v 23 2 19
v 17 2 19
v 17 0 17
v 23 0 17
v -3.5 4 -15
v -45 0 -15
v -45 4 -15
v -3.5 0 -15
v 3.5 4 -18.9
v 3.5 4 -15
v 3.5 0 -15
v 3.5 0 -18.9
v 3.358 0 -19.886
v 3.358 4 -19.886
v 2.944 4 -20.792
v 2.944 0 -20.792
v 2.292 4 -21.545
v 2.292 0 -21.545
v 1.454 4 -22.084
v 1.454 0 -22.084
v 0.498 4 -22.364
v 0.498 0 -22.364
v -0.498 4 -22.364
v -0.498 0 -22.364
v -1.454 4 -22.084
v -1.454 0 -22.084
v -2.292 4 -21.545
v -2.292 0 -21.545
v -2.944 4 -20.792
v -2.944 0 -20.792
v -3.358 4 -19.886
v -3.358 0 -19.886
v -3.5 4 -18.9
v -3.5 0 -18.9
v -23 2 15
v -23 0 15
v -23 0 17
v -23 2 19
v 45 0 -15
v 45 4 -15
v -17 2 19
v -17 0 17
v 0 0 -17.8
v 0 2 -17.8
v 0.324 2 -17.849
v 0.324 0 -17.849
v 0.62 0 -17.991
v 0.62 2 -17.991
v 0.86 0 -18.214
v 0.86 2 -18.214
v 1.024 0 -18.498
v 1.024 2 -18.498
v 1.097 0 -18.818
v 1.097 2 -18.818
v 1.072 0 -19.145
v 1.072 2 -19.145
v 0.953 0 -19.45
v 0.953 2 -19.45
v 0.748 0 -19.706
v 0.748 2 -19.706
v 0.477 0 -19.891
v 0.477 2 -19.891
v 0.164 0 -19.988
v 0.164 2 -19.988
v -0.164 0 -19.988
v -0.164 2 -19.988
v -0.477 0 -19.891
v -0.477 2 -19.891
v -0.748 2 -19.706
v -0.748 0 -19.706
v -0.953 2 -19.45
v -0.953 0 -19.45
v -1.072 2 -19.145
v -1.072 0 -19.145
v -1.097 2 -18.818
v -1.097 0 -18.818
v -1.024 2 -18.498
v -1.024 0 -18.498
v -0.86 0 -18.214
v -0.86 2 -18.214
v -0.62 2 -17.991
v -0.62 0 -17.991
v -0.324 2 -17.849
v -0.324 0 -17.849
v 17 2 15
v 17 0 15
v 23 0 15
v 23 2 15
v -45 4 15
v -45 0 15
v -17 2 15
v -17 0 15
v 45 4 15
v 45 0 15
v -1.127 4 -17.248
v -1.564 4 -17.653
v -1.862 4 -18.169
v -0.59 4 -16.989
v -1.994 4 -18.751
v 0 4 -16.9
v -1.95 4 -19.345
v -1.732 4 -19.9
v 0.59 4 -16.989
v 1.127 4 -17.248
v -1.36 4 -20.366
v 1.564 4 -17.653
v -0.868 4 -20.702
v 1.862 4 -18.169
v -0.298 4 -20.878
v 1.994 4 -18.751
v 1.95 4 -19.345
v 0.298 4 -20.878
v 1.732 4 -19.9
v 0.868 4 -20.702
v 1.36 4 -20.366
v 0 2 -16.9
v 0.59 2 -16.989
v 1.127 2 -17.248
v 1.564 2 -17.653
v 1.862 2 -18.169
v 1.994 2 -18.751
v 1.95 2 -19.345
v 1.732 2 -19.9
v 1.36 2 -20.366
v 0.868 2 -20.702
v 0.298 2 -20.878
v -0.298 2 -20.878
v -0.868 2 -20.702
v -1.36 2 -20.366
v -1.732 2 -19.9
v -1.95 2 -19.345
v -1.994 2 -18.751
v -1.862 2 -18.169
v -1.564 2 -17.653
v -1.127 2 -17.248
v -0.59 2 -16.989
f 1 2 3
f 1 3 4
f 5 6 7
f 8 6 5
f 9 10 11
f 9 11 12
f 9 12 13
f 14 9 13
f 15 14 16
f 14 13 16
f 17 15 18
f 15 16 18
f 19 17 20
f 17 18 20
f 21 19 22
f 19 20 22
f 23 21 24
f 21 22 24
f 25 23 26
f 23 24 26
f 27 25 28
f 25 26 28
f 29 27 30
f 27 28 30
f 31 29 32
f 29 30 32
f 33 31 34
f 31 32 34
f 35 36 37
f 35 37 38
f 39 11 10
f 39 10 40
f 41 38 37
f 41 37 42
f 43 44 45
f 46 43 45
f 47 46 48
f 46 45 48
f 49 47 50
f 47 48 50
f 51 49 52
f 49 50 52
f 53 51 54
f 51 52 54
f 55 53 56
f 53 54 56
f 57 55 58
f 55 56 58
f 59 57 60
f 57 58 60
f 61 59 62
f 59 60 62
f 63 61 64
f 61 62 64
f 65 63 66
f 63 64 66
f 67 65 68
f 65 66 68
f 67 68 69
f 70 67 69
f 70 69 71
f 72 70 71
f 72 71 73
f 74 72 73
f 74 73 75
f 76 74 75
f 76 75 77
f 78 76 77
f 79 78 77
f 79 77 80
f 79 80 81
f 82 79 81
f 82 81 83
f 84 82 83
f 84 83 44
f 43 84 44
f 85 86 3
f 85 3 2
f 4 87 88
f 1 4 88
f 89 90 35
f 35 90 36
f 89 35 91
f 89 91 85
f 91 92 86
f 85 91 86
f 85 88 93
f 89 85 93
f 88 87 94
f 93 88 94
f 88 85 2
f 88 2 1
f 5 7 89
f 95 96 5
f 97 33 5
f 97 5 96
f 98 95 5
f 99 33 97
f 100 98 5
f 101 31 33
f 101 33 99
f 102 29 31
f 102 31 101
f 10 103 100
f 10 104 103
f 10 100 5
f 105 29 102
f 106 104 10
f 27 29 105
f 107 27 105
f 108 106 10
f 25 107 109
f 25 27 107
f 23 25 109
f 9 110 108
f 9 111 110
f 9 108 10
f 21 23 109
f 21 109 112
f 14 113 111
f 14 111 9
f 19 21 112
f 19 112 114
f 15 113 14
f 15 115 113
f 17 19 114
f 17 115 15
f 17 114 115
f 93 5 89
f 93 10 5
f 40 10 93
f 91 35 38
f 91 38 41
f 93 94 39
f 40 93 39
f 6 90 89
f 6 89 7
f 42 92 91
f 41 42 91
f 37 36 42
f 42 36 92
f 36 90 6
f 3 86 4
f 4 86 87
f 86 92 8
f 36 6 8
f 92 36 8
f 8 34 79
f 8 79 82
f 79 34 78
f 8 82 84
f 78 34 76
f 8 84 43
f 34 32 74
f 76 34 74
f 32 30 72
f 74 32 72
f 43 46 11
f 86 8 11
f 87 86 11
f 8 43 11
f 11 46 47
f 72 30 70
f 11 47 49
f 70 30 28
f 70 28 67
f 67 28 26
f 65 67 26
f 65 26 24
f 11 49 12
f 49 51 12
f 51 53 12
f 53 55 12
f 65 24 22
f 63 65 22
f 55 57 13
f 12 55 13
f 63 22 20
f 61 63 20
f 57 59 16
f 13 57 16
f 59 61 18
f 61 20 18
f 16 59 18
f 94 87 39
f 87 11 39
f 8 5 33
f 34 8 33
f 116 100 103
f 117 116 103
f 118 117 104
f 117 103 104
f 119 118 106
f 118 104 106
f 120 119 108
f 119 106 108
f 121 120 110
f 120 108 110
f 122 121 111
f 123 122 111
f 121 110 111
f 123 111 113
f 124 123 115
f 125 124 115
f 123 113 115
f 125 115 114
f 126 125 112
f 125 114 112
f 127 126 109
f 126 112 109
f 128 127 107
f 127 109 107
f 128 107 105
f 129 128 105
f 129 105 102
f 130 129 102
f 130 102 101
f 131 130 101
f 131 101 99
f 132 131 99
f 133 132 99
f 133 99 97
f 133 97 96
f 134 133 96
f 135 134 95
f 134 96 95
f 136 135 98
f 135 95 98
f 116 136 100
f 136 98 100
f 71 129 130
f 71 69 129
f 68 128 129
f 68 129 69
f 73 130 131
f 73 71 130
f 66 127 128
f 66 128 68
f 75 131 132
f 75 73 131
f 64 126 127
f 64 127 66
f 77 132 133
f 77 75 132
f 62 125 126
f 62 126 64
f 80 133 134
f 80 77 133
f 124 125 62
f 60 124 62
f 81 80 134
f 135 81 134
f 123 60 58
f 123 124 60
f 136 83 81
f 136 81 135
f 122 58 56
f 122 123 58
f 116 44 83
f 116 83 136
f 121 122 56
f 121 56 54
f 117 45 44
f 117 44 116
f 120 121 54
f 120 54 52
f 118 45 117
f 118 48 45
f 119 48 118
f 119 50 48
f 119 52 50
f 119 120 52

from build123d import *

# Parameters (mm, degrees)
SKETCH1_R           = 3.5
SKETCH1_W           = 90
SKETCH1_H           = 30
SKETCH1_W_2         = 7
SKETCH1_H_2         = 3.9
BOSS_EXTRUDE1_DEPTH = 4
SKETCH4_W           = 6
SKETCH4_H           = 2
BOSS_EXTRUDE2_DEPTH = 4
CHAMFER1_SIZE       = 2
CUT_EXTRUDE1_REACH  = 52.426
SKETCH5_R           = 1.1
SKETCH6_R           = 2
CUT_EXTRUDE2_DEPTH  = 2


with BuildPart() as part:
    # Sketch1 → Boss-Extrude1 (new body)
    with BuildSketch(Plane(origin=(0, 0, 0), x_dir=(1, 0, 0), z_dir=(0, 1, 0))):
        with Locations((0, 18.9)):
            Circle(SKETCH1_R)
        Rectangle(SKETCH1_W, SKETCH1_H)
        with Locations((0, 16.95)):
            Rectangle(SKETCH1_W_2, SKETCH1_H_2)
    extrude(amount=BOSS_EXTRUDE1_DEPTH)

    # Sketch4 → Boss-Extrude2 (add)
    with BuildSketch(Plane.XY.offset(15)):
        with Locations((-20, 1)):
            Rectangle(SKETCH4_W, SKETCH4_H)
        with Locations((20, 1)):
            Rectangle(SKETCH4_W, SKETCH4_H)
    extrude(amount=BOSS_EXTRUDE2_DEPTH)

    # Chamfer1
    chamfer1_edges = [part.edges().sort_by_distance(p)[0] for p in [
        (20, 0, 19),
        (-20, 0, 19),
    ]]
    chamfer(chamfer1_edges, length=CHAMFER1_SIZE - 0.0001)  # a hair under: the kernel refuses the full size

    # Sketch5 → Cut-Extrude1 (cut, up to next)
    with BuildSketch(Plane(origin=(0, 4, 0), x_dir=(1, 0, 0), z_dir=(0, 1, 0)), mode=Mode.PRIVATE) as cut_extrude1_sk1:
        with Locations(Location((0, 18.9, 0), (0, 0, 270))):
            Circle(SKETCH5_R)
    cut_extrude1_tool1 = extrude(cut_extrude1_sk1.sketch, amount=-CUT_EXTRUDE1_REACH, mode=Mode.PRIVATE) & part.part
    add(cut_extrude1_tool1.solids().sort_by_distance((0, 4, -18.9))[0], mode=Mode.SUBTRACT)

    # Sketch6 → Cut-Extrude2 (cut)
    with BuildSketch(Plane(origin=(0, 4, 0), x_dir=(1, 0, 0), z_dir=(0, 1, 0))):
        with Locations(Location((0, 18.9, 0), (0, 0, 270))):
            Circle(SKETCH6_R)
    extrude(amount=-CUT_EXTRUDE2_DEPTH, mode=Mode.SUBTRACT)


solid = part.part
